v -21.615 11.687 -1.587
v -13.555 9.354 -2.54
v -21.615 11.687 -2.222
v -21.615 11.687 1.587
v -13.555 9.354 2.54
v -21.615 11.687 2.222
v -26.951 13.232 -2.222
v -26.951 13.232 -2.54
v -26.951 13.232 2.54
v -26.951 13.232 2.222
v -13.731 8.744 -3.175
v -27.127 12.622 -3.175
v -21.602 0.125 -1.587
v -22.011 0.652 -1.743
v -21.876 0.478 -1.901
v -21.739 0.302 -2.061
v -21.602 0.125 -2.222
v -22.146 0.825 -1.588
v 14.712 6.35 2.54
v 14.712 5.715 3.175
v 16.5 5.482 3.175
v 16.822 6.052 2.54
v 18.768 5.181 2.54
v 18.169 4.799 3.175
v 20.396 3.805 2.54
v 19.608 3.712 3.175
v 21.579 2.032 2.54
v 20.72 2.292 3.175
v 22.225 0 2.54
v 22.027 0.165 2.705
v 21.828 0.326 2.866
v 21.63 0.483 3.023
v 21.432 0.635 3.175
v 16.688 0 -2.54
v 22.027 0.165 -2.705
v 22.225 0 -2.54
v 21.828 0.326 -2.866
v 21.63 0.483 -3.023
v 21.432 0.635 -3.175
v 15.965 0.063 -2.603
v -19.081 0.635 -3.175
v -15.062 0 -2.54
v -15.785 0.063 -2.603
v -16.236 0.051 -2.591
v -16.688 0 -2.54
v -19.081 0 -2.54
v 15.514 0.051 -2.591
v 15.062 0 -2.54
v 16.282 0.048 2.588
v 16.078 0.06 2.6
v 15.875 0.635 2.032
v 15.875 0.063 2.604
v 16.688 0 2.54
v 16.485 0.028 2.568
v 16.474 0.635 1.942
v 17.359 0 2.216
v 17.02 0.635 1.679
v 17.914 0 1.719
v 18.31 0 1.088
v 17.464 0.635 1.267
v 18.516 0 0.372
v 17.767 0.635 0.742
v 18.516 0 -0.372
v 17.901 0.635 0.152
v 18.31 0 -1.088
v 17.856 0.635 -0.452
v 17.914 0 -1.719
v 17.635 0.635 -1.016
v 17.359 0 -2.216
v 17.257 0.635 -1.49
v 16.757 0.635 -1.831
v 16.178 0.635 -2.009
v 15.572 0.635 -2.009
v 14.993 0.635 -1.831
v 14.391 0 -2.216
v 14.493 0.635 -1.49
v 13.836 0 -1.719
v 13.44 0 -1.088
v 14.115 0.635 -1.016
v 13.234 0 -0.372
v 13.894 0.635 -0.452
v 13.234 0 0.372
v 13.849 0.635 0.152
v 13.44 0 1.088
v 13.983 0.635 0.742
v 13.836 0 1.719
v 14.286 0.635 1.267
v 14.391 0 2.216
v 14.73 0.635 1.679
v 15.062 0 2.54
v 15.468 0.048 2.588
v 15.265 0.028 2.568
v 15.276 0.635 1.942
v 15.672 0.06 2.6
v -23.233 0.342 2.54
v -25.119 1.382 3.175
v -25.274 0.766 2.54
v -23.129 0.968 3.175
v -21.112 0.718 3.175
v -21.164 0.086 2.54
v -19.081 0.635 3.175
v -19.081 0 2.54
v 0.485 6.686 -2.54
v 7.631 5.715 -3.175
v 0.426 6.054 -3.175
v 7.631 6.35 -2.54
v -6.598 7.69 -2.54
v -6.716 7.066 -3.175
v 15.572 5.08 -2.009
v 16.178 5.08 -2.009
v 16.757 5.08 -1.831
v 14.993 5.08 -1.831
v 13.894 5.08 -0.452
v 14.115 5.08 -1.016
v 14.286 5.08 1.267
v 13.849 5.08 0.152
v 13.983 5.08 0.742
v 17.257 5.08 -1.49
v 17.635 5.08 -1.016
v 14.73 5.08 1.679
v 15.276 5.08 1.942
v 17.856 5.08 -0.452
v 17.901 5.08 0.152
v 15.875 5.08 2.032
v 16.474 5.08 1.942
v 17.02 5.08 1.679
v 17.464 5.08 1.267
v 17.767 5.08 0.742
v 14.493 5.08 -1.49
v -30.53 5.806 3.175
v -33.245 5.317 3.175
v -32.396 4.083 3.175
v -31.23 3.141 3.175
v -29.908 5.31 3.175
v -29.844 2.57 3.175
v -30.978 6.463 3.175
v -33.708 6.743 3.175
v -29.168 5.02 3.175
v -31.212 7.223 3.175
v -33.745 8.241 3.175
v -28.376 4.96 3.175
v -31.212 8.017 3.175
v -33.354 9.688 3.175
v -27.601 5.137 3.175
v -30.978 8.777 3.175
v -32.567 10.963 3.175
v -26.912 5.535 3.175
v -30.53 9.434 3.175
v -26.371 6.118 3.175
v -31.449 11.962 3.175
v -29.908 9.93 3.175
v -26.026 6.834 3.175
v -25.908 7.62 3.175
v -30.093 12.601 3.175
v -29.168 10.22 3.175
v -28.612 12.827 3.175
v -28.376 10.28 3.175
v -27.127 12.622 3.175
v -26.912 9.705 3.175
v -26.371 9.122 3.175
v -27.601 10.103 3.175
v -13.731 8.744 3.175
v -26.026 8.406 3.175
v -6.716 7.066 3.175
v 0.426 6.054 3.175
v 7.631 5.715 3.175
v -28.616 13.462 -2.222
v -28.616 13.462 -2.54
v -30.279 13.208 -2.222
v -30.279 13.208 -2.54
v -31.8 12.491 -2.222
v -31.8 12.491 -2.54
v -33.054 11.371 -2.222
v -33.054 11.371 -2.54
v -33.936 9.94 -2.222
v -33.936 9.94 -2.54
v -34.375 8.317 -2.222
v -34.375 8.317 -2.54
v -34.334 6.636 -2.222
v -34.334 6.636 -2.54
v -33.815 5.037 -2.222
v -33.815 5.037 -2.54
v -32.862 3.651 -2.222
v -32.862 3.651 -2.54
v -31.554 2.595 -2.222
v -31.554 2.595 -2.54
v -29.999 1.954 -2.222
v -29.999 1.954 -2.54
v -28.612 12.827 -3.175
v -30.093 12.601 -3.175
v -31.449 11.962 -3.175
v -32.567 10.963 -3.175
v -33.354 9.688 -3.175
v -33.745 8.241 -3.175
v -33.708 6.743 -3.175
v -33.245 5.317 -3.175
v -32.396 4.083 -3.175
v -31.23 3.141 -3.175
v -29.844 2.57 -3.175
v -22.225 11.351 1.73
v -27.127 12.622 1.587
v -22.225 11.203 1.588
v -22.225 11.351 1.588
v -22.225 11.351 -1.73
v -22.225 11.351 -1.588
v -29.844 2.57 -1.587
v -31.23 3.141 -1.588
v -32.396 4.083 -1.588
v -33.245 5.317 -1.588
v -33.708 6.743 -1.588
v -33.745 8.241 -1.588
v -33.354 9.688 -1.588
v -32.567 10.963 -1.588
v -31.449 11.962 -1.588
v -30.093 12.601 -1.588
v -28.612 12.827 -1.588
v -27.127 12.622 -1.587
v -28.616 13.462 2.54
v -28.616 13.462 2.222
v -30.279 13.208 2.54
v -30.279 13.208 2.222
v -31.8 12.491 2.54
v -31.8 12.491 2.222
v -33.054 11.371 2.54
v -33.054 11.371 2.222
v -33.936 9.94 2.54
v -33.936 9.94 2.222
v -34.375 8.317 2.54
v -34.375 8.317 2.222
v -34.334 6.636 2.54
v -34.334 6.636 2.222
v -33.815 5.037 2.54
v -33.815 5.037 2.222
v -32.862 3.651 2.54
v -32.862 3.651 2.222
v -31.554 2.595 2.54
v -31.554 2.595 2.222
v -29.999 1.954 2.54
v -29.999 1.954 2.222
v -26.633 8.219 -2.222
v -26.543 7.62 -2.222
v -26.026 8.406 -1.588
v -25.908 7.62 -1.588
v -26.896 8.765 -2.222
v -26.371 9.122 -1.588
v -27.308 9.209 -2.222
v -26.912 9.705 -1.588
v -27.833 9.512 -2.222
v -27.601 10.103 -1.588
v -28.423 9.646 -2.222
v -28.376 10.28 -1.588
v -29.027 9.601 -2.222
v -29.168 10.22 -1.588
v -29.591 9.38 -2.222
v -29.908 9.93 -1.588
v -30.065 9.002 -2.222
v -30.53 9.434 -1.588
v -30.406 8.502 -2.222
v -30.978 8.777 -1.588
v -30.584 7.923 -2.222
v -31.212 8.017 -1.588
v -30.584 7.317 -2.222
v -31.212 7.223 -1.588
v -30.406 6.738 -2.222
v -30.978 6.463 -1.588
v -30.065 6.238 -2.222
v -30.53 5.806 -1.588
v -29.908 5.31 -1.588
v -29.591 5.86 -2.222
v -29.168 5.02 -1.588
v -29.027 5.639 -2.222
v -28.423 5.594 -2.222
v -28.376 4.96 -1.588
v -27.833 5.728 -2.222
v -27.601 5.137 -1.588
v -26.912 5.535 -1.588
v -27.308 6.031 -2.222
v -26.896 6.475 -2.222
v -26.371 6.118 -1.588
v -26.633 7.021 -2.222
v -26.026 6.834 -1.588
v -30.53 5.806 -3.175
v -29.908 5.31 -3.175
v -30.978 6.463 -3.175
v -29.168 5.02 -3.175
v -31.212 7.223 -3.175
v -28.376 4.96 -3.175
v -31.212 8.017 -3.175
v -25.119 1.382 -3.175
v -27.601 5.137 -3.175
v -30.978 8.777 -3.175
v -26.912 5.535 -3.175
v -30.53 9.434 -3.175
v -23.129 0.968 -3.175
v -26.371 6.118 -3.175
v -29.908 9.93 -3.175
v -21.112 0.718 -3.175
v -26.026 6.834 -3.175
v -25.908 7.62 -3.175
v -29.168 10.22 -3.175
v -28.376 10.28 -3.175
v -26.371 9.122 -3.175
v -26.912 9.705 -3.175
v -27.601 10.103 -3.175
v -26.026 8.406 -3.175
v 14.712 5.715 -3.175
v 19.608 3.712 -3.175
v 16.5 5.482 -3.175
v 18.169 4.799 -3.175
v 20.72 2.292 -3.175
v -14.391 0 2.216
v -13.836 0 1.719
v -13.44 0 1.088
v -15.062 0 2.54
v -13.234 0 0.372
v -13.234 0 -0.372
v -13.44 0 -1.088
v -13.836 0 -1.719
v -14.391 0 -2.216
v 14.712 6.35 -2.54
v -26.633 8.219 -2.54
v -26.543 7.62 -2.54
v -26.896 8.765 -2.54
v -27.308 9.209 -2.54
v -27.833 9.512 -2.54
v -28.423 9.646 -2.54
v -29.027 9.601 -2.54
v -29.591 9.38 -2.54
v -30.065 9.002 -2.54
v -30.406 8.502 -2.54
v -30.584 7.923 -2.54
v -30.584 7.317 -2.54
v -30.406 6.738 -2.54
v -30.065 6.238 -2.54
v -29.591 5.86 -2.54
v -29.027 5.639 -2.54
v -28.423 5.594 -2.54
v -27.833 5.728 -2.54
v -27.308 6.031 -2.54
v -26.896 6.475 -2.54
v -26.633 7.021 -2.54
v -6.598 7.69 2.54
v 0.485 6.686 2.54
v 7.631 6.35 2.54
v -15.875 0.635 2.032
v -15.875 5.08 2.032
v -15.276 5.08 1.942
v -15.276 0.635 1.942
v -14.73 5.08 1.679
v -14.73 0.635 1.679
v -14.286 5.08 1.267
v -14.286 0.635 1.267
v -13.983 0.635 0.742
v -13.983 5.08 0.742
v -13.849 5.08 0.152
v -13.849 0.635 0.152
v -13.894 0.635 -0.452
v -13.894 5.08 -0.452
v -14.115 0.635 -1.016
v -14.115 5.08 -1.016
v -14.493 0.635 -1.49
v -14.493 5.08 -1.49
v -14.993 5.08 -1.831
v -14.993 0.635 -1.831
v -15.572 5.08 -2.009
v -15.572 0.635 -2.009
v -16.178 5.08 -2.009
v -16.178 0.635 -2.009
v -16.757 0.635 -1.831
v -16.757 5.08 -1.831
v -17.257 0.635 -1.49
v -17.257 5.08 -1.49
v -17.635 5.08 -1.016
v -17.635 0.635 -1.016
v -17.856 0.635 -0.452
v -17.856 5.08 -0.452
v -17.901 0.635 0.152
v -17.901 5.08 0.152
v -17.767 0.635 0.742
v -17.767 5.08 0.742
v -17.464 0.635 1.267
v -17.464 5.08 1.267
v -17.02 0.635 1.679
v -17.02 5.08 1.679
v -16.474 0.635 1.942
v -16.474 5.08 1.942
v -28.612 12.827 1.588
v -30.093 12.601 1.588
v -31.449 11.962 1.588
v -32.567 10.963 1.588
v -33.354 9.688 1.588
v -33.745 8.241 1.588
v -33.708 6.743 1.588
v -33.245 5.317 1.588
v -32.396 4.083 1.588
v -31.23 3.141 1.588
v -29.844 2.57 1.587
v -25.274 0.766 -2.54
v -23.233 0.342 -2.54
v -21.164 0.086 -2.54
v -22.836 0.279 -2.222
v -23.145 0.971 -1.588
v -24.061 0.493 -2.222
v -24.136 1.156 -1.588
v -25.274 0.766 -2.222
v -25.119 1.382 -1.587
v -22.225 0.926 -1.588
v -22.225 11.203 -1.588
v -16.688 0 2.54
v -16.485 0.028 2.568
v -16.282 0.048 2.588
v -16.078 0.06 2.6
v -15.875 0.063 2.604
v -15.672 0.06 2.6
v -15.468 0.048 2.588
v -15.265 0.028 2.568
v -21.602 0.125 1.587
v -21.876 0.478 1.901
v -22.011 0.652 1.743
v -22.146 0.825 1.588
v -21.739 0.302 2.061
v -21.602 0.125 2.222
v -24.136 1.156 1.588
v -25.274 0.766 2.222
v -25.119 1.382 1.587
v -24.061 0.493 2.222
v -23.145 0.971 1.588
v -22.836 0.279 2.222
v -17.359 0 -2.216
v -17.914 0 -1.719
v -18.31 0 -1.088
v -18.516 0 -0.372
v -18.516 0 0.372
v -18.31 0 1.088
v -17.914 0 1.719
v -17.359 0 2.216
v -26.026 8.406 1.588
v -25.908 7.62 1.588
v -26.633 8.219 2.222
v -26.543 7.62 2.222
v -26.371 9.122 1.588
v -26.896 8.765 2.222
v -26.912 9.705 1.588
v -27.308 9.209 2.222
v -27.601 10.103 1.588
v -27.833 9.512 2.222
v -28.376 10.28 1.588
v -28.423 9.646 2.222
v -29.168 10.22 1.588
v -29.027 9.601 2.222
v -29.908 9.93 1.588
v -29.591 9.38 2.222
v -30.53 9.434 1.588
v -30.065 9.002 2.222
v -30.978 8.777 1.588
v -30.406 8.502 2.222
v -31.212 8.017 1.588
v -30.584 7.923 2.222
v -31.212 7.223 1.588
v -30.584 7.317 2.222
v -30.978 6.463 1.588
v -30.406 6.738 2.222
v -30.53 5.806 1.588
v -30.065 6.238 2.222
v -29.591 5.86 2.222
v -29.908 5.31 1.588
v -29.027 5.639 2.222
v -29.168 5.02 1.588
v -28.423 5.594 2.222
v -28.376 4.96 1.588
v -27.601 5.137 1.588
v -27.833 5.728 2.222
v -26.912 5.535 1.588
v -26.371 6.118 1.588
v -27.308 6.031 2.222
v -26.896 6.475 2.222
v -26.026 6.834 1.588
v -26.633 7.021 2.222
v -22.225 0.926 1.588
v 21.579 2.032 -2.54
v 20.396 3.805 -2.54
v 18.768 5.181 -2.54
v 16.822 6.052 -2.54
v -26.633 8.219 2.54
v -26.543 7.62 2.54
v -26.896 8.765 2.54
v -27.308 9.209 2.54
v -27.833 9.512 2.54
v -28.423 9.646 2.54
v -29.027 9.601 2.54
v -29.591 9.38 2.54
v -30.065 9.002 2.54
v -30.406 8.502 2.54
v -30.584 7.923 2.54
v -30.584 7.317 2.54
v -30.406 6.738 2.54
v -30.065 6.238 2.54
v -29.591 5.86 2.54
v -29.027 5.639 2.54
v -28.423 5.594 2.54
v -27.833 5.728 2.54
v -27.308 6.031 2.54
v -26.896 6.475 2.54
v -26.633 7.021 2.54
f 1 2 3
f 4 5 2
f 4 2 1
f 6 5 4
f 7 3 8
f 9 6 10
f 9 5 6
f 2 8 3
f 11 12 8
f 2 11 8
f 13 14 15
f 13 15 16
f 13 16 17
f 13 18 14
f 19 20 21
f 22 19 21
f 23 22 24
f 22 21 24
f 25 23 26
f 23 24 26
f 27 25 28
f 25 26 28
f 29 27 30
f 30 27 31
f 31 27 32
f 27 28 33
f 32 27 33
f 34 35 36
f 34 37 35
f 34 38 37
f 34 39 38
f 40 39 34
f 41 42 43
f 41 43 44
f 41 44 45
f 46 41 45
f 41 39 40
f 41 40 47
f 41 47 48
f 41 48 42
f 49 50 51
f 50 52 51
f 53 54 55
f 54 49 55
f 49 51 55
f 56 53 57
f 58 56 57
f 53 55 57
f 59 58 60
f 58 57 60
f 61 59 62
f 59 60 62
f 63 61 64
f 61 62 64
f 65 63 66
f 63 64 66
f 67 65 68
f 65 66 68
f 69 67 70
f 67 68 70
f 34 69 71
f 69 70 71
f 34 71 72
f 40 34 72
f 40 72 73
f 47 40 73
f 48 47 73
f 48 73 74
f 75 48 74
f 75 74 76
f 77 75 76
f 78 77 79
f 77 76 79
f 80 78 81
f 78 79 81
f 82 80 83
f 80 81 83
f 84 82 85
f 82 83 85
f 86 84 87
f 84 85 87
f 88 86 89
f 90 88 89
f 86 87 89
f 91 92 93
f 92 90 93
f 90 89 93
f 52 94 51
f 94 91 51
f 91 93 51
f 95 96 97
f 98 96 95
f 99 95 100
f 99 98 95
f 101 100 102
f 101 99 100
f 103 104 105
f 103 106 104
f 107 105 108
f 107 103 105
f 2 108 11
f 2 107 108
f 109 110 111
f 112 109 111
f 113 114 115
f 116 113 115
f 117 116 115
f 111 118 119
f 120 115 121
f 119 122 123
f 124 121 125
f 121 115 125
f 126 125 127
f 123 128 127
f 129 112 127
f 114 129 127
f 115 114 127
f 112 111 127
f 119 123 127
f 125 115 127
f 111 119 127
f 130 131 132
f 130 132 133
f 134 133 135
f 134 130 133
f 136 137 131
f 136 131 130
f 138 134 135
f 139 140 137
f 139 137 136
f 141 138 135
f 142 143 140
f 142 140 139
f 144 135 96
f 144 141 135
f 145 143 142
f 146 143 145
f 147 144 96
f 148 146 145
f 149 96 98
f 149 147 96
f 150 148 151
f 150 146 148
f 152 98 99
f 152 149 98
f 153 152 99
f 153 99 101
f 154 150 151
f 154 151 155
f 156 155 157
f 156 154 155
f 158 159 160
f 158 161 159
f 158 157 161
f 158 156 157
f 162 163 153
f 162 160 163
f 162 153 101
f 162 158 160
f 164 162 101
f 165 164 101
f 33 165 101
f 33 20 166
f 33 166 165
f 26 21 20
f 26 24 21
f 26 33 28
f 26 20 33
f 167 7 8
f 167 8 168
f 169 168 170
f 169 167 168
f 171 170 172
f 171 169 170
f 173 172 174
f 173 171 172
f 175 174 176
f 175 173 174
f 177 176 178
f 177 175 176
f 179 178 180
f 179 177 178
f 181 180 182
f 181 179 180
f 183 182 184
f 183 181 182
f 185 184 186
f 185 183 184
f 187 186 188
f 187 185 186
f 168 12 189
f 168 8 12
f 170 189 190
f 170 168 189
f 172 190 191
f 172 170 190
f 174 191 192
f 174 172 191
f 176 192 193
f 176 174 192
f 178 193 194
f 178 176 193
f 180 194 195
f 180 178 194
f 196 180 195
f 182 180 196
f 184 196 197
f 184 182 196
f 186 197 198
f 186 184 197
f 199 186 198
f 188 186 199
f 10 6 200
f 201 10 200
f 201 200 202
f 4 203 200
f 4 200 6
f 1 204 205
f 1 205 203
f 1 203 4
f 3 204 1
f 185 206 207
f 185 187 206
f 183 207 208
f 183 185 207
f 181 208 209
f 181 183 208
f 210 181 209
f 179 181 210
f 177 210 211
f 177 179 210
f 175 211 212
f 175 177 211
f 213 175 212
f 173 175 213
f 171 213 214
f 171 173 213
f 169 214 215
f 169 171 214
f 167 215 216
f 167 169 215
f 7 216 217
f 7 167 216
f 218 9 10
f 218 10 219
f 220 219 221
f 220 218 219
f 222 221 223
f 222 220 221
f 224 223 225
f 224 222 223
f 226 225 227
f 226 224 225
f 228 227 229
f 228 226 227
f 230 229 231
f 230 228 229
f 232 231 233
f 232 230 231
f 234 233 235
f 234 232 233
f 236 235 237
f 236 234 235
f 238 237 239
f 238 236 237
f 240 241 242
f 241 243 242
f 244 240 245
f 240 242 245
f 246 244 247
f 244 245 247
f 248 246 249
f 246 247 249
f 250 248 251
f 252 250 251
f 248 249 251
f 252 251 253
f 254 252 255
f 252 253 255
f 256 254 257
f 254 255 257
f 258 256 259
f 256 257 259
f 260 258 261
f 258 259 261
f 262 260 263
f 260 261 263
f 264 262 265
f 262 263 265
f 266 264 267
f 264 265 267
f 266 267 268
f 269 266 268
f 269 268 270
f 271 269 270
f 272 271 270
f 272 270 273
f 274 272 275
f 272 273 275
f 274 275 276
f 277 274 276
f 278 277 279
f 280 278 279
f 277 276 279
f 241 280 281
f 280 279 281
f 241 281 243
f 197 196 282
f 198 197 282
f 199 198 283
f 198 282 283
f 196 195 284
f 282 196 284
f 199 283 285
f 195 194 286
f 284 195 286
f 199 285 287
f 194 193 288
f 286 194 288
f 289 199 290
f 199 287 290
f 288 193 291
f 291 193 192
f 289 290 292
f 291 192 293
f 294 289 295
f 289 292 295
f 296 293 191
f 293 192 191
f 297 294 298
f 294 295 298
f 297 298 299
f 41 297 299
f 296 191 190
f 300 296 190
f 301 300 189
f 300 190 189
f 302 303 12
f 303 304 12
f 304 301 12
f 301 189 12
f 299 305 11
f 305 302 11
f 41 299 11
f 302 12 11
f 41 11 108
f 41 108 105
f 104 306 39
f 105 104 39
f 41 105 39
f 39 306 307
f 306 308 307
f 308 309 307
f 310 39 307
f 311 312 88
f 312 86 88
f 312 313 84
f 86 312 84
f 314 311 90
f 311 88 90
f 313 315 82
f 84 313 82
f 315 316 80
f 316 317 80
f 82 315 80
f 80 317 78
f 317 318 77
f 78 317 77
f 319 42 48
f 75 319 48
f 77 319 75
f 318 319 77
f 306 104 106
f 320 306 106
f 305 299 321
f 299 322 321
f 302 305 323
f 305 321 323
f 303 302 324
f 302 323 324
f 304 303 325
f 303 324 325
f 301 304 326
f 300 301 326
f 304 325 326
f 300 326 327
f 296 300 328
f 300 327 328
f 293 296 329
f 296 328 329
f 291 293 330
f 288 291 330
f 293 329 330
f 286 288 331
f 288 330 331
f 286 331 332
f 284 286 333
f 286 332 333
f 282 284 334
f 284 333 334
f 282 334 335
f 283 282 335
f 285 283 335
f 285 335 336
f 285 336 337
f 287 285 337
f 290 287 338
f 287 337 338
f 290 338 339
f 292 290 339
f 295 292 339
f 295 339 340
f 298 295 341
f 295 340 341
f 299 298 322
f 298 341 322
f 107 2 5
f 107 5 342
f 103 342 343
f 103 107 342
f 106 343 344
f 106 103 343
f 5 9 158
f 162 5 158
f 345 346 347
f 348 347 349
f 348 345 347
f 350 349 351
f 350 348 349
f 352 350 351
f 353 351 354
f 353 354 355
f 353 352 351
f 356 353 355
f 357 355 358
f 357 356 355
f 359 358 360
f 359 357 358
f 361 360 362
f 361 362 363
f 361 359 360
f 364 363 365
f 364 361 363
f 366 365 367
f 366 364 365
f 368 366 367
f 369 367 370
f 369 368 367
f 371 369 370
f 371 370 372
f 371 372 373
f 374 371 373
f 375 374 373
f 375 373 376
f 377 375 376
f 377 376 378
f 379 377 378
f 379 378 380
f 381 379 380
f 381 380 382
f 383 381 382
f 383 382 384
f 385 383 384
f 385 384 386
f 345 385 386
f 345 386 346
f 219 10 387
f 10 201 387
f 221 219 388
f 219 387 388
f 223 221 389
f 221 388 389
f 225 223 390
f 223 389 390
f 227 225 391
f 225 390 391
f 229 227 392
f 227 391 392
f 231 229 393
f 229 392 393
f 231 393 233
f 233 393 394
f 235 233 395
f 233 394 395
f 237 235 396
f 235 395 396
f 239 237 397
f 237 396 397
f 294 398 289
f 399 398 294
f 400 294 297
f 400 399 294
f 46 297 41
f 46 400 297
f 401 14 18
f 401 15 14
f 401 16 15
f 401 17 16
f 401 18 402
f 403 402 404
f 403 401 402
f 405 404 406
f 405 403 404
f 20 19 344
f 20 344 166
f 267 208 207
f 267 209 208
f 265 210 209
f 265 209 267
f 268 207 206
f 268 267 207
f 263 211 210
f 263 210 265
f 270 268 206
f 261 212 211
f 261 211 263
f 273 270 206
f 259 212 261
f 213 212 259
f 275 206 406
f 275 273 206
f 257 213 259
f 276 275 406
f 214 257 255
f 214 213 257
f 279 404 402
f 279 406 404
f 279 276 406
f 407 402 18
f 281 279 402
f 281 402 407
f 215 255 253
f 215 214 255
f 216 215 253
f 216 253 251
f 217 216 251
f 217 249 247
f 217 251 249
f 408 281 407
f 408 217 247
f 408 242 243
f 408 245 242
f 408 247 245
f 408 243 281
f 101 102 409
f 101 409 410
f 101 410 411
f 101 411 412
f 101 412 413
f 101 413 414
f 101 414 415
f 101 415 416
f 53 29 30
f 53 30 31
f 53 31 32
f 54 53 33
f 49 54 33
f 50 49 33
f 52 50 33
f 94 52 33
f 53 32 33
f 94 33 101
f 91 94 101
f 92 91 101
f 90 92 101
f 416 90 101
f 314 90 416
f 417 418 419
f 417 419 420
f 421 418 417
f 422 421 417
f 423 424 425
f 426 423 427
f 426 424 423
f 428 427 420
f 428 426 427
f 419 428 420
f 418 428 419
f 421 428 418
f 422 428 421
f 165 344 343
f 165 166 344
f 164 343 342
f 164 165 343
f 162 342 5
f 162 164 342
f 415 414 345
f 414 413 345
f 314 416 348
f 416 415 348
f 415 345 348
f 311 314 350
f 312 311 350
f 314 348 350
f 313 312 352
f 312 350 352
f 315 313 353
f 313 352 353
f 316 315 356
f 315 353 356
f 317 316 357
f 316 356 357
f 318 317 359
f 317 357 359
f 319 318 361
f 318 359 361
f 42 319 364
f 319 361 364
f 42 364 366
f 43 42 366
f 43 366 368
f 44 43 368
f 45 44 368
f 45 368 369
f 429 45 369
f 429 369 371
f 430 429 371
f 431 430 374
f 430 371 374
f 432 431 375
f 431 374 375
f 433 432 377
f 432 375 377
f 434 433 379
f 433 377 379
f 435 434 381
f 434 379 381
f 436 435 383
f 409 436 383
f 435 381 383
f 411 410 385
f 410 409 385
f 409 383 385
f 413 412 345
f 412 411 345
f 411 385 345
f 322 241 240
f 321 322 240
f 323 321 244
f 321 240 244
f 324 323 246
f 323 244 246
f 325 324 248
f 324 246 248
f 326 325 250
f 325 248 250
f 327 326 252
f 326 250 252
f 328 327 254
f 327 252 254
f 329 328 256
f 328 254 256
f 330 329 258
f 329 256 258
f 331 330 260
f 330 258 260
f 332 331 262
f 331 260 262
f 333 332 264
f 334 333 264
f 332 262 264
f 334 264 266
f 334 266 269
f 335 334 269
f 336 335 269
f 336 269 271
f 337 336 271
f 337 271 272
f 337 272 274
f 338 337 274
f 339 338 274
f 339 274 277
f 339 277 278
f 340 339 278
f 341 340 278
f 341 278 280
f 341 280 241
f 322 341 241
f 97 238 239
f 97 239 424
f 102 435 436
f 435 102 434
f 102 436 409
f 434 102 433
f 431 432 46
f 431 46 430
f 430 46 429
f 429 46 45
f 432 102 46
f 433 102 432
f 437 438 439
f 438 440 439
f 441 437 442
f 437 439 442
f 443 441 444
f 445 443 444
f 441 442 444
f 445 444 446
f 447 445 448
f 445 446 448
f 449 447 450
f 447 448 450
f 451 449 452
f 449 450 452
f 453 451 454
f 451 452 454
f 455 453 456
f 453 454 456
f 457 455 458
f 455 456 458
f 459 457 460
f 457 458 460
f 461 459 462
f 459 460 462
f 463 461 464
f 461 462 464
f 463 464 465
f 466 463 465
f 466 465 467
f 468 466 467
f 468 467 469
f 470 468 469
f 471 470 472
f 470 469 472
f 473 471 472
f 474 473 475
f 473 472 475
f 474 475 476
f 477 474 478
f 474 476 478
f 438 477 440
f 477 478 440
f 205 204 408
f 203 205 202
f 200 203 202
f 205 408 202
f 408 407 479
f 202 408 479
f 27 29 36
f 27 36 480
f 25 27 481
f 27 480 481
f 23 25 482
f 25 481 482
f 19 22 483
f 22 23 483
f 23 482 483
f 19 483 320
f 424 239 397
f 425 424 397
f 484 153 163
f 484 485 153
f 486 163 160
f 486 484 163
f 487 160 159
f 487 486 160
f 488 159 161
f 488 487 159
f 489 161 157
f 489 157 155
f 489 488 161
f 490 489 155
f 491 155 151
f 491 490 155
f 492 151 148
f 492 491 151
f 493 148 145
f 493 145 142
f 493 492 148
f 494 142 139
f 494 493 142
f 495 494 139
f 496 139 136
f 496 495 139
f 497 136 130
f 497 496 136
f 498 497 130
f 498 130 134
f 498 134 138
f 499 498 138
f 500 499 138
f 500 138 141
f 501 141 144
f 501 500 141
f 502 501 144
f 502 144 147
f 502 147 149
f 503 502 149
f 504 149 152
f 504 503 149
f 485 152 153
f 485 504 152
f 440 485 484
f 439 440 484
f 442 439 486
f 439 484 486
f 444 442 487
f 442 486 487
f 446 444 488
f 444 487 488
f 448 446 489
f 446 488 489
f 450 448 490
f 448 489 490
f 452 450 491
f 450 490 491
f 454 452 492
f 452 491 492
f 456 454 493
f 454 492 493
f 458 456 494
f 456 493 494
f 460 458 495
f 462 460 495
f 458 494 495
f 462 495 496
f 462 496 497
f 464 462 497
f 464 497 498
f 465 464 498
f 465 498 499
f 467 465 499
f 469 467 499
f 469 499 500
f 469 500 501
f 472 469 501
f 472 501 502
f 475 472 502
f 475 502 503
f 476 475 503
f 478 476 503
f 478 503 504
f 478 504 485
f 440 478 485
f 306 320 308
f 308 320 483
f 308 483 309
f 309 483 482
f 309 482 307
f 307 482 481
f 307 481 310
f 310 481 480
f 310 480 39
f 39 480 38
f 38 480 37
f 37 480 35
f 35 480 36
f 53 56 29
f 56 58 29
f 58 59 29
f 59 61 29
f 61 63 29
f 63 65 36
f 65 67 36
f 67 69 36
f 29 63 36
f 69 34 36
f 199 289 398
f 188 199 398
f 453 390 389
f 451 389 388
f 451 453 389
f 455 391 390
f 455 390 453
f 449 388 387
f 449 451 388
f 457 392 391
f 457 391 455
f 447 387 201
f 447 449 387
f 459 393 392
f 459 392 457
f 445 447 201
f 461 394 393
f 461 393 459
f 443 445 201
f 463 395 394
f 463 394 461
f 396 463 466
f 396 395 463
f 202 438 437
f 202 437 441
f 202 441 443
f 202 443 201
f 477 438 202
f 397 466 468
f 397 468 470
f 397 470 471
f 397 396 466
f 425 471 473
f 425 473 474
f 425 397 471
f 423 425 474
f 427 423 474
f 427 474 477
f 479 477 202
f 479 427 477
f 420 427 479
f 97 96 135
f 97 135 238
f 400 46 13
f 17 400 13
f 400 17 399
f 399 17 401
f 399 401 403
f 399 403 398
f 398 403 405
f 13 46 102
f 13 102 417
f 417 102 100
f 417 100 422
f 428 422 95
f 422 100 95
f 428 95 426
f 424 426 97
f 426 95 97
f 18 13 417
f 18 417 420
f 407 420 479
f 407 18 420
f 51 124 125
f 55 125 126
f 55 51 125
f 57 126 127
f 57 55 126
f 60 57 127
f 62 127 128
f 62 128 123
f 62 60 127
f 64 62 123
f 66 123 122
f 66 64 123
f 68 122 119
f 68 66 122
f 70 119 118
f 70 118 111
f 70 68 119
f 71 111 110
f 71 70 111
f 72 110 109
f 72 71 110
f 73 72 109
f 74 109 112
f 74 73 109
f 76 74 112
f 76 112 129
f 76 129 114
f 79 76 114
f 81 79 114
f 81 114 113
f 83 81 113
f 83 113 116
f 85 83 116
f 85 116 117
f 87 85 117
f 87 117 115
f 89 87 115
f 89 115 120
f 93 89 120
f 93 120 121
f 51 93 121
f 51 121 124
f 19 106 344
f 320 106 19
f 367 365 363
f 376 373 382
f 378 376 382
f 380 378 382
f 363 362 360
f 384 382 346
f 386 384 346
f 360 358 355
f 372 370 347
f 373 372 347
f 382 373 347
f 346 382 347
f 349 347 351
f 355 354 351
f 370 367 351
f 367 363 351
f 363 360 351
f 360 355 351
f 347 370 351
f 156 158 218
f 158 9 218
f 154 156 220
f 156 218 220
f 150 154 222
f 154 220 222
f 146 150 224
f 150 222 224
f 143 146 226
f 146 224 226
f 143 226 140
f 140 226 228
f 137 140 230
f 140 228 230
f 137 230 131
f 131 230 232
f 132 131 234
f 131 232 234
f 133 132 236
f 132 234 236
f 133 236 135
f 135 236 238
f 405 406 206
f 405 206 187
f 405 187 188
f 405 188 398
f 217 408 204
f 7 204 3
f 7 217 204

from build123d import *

# Parameters (mm, degrees)
SKETCH1_W           = 44.45
SKETCH1_H           = 6.35
BOSS_EXTRUDE1_DEPTH = 6.35
SKETCH2_R           = 5.842
SKETCH2_R_2         = 2.032
BOSS_EXTRUDE2_DEPTH = 6.35
SKETCH4_W           = 12.192
SKETCH4_H           = 3.175
CUT_EXTRUDE2_DEPTH  = 38.092262778
FILLET1_R           = 76.2
FILLET2_R           = 25.4
FILLET3_R           = 7.62
SKETCH1_3_R         = 2.032
CUT_EXTRUDE1_DEPTH  = 5.08
CHAMFER2_SIZE       = 0.635
CHAMFER2_SIZE_2     = 0.512675012
CHAMFER2_SIZE_3     = 0.731105081


with BuildPart() as part:
    # Sketch1 → Boss-Extrude1 (new body)
    with BuildSketch(Plane(origin=(0, 0, 0), x_dir=(1, 0, 0), z_dir=(0, 1, 0))):
        Rectangle(SKETCH1_W, SKETCH1_H)
    extrude(amount=BOSS_EXTRUDE1_DEPTH)

    # Sketch2 → Boss-Extrude2 (add, through all)
    # profile 1 of 2: a face of its own
    with BuildSketch(Plane.XY.offset(3.175)):
        with BuildLine():
            Line((-3.175, 6.35), (-26.950756689, 13.231666211))
            ThreePointArc((-26.950756689, 13.231666211), (-23.905000352, 11.12999534), (-22.733, 7.62))
            ThreePointArc((-22.733, 7.62), (-24.982746663, 3.012974934), (-29.999237577, 1.954268686))
            Line((-29.999237577, 1.954268686), (-22.225, 0))
            Line((-22.225, 0), (-22.225, 6.35))
            Line((-22.225, 6.35), (-3.175, 6.35))
        make_face()
    # profile 2 of 2: a face of its own
    with BuildSketch(Plane.XY.offset(3.175)):
        with Locations((-28.575, 7.62)):
            Circle(SKETCH2_R)
        with Locations((-28.575, 7.62)):
            Circle(SKETCH2_R_2, mode=Mode.SUBTRACT)
    extrude(amount=-BOSS_EXTRUDE2_DEPTH)

    # Sketch4 → Cut-Extrude2 (cut, through all)
    with BuildSketch(Plane.XZ):
        with Locations((-28.321, 0)):
            Rectangle(SKETCH4_W, SKETCH4_H)
    extrude(amount=-CUT_EXTRUDE2_DEPTH, mode=Mode.SUBTRACT)

    # Fillet1
    fillet1_edges = [part.edges().sort_by_distance(p)[0] for p in [
        (-3.175, 6.35, 0),
    ]]
    fillet(fillet1_edges, radius=FILLET1_R)

    # Fillet2
    # the kernel refuses this fillet: 25.4 mm, written as the material it takes off along each edge
    with BuildSketch(Plane(origin=(-22.225, 0, 6.271484857), x_dir=(-0.9698273389527705, 0.2437928067433249, 0), z_dir=(0, 0, -1))) as fillet2_piece_1:
        with BuildLine():
            CenterArc((FILLET2_R * 0.123763541059, FILLET2_R), FILLET2_R, 255.889496413, 14.110503587)
            Line((-FILLET2_R * 0.120029265684, FILLET2_R * 0.0301726610472), (0, 0))
            Line((0, 0), (FILLET2_R * 0.123763541059, 0))
        make_face()
    extrude(amount=17.305469714, mode=Mode.SUBTRACT)
    with BuildSketch(Plane(origin=(-22.225, 0, 11.033984857), x_dir=(1, 0, 0), z_dir=(0, 0, -1))) as fillet2_piece_2:
        with BuildLine():
            CenterArc((FILLET2_R * 0.123763541059, -FILLET2_R), FILLET2_R, 90, 14.110503587)
            Line((-FILLET2_R * 0.120029265684, -FILLET2_R * 0.0301726610472), (0, 0))
            Line((0, 0), (FILLET2_R * 0.123763541059, 0))
        make_face()
    extrude(amount=17.305469714, mode=Mode.SUBTRACT)

    # Fillet3
    # the kernel refuses this fillet: 7.62 mm, written as the material it takes off along each edge
    with BuildSketch(Plane(origin=(22.225, 6.35, -21.958553311), x_dir=(0, -1, 0), z_dir=(0, 0, 1))) as fillet3_piece_1:
        with BuildLine():
            CenterArc((7.62, -7.513421325), FILLET3_R, 99.594068227, 80.405931773)
            Line((0, -7.513421325), (-0.1524, -7.513421325))
            Line((-0.1524, -7.513421325), (-0.1524, 0))
            Line((-0.1524, 0), (0, 0.1524))
            ThreePointArc((0, 0.1524), (3.175, 0.1524), (6.3246, 0.150268426))
            Line((6.3246, 0.150268426), (6.35, 0))
        make_face()
    extrude(amount=43.917106623, mode=Mode.SUBTRACT)

    # Sketch1<3> → Cut-Extrude1 (cut)
    with BuildSketch(Plane(origin=(0, 0, 0), x_dir=(1, 0, 0), z_dir=(0, 1, 0))):
        with Locations(Location((-15.875, 0, 0), (0, 0, 270))):
            Circle(SKETCH1_3_R)
        with Locations(Location((15.875, 0, 0), (0, 0, 270))):
            Circle(SKETCH1_3_R)
    extrude(amount=CUT_EXTRUDE1_DEPTH, mode=Mode.SUBTRACT)

    # Chamfer2
    # the kernel refuses this chamfer: 0.731105081, 0.635, 0.512675012 mm, written as the material it takes off along each edge
    with BuildSketch(Plane(origin=(-13.554867596, 9.354353764, 3.175), x_dir=(0, 0, -1), z_dir=(-0.9605727852432785, 0.27802863926216387, 0)), Plane(origin=(-13.554867596, 9.354353764, -3.175), x_dir=(-0.27802863926216387, -0.9605727852432785, 0), z_dir=(-0.9605727852432785, 0.27802863926216387, 0))) as chamfer2_piece_1:
        Polygon((CHAMFER2_SIZE, 0), (0, CHAMFER2_SIZE), (0, 0), align=None)
    extrude(amount=13.945730401, mode=Mode.SUBTRACT)
    with BuildSketch(Plane(origin=(-29.999237577, 1.954268686, -3.175), x_dir=(0.2437928067433245, 0.9698273389527705, 0), z_dir=(0.9698273389527705, -0.24379280674332449, 0))) as chamfer2_piece_2:
        Polygon((CHAMFER2_SIZE, 0), (0, CHAMFER2_SIZE), (0, 0), align=None)
    extrude(amount=4.872510847, mode=Mode.SUBTRACT)
    with BuildSketch(Plane(origin=(-28.575, 7.62, -3.175), x_dir=(0.2780286392621638, 0.9605727852432784, 0), z_dir=(0.9605727852432784, -0.2780286392621638, 0))) as chamfer2_piece_3:
        Polygon((5.842 - CHAMFER2_SIZE, 0), (5.842, CHAMFER2_SIZE), (5.842, 0), align=None)
    revolve(axis=Axis((-28.575, 7.62, -3.175), (0, 0, 1)), revolution_arc=182.032079325, mode=Mode.SUBTRACT)
    with BuildSketch(Plane(origin=(-28.575, 7.62, 3.175), x_dir=(1, 0, 0), z_dir=(0, -1, 0))) as chamfer2_piece_4:
        Polygon((2.032 + CHAMFER2_SIZE, 0), (2.032, -CHAMFER2_SIZE), (2.032, 0), align=None)
    revolve(axis=Axis((-28.575, 7.62, 3.175), (0, 0, 1)), mode=Mode.SUBTRACT)
    with BuildSketch(Plane(origin=(-28.575, 7.62, -3.175), x_dir=(1, 0, 0), z_dir=(0, -1, 0))) as chamfer2_piece_5:
        Polygon((2.032 + CHAMFER2_SIZE, 0), (2.032, CHAMFER2_SIZE), (2.032, 0), align=None)
    revolve(axis=Axis((-28.575, 7.62, -3.175), (0, 0, 1)), mode=Mode.SUBTRACT)
    with BuildSketch(Plane(origin=(-28.575, 7.62, 3.175), x_dir=(0.2780286392621638, 0.9605727852432784, 0), z_dir=(0.9605727852432784, -0.2780286392621638, 0))) as chamfer2_piece_6:
        Polygon((5.842 - CHAMFER2_SIZE, 0), (5.842, -CHAMFER2_SIZE), (5.842, 0), align=None)
    revolve(axis=Axis((-28.575, 7.62, 3.175), (0, 0, 1)), revolution_arc=182.032079325, mode=Mode.SUBTRACT)
    with BuildSketch(Plane(origin=(-29.999237577, 1.954268686, 3.175), x_dir=(0.24379280674332446, 0.9698273389527705, 0), z_dir=(0.9698273389527705, -0.24379280674332449, 0))) as chamfer2_piece_7:
        Polygon((CHAMFER2_SIZE, 0), (0, -CHAMFER2_SIZE), (0, 0), align=None)
    extrude(amount=4.872510847, mode=Mode.SUBTRACT)
    with BuildSketch(Plane(origin=(-28.575, 7.62, -1.5875), x_dir=(1, 0, 0), z_dir=(0, -1, 0))) as chamfer2_piece_8:
        Polygon((2.032, -CHAMFER2_SIZE), (2.032 + CHAMFER2_SIZE, 0), (2.032, 0), align=None)
    revolve(axis=Axis((-28.575, 7.62, -1.5875), (0, 0, 1)), mode=Mode.SUBTRACT)
    with BuildSketch(Plane(origin=(-28.575, 7.62, 1.5875), x_dir=(1, 0, 0), z_dir=(0, -1, 0))) as chamfer2_piece_9:
        Polygon((2.032 + CHAMFER2_SIZE, 0), (2.032, CHAMFER2_SIZE), (2.032, 0), align=None)
    revolve(axis=Axis((-28.575, 7.62, 1.5875), (0, 0, 1)), mode=Mode.SUBTRACT)
    with BuildSketch(Plane(origin=(7.630914716, 6.35, -3.175), x_dir=(0, -1, 0), z_dir=(1, 0, 0))) as chamfer2_piece_10:
        Polygon((CHAMFER2_SIZE, 0), (0, -CHAMFER2_SIZE), (0, 0), align=None)
    extrude(amount=7.08066396, mode=Mode.SUBTRACT)
    with BuildSketch(Plane(origin=(14.711578675, 6.35, 3.175), x_dir=(0, 0, -1), z_dir=(-1, 0, 0))) as chamfer2_piece_11:
        Polygon((CHAMFER2_SIZE, 0), (0, CHAMFER2_SIZE), (0, 0), align=None)
    extrude(amount=7.08066396, mode=Mode.SUBTRACT)
    with BuildSketch(Plane(origin=(7.630914716, 82.55, 3.175), x_dir=(0, -1, 0), z_dir=(1, 0, 0))) as chamfer2_piece_12:
        Polygon((76.2, CHAMFER2_SIZE), (76.2 + CHAMFER2_SIZE, 0), (76.2, 0), align=None)
    revolve(axis=Axis((7.630914716, 82.55, 3.175), (0, 0, -1)), revolution_arc=16.142582912, mode=Mode.SUBTRACT)
    with BuildSketch(Plane(origin=(7.630914716, 82.55, -3.175), x_dir=(0, -1, 0), z_dir=(1, 0, 0))) as chamfer2_piece_13:
        Polygon((76.2 + CHAMFER2_SIZE, 0), (76.2, -CHAMFER2_SIZE), (76.2, 0), align=None)
    revolve(axis=Axis((7.630914716, 82.55, -3.175), (0, 0, -1)), revolution_arc=16.142582912, mode=Mode.SUBTRACT)
    with BuildSketch(Plane(origin=(23.858018697, 0, 3.175), x_dir=(0, 0, -1), z_dir=(-1, 0, 0))) as chamfer2_piece_14:
        Polygon((CHAMFER2_SIZE, 0), (0, -CHAMFER2_SIZE), (0, 0), align=None)
    extrude(amount=42.939424754, mode=Mode.SUBTRACT)
    with BuildSketch(Plane(origin=(-19.081406057, 25.4, 3.175), x_dir=(-0.24379280674296488, -0.9698273389528609, 0), z_dir=(-0.9698273389528609, 0.24379280674296488, 0))) as chamfer2_piece_15:
        Polygon((25.4, -CHAMFER2_SIZE), (25.4 - CHAMFER2_SIZE, 0), (25.4, 0), align=None)
    revolve(axis=Axis((-19.081406057, 25.4, 3.175), (0, 0, 1)), revolution_arc=14.110503587, mode=Mode.SUBTRACT)
    with BuildSketch(Plane(origin=(-19.081406057, 0, -3.175), x_dir=(0, 1, 0), z_dir=(1, 0, 0))) as chamfer2_piece_16:
        Polygon((CHAMFER2_SIZE, 0), (0, CHAMFER2_SIZE), (0, 0), align=None)
    extrude(amount=42.939424754, mode=Mode.SUBTRACT)
    with BuildSketch(Plane(origin=(-19.081406057, 25.4, -3.175), x_dir=(-0.24379280674296488, -0.9698273389528609, 0), z_dir=(-0.9698273389528609, 0.24379280674296488, 0))) as chamfer2_piece_17:
        Polygon((25.4 - CHAMFER2_SIZE, 0), (25.4, CHAMFER2_SIZE), (25.4, 0), align=None)
    revolve(axis=Axis((-19.081406057, 25.4, -3.175), (0, 0, 1)), revolution_arc=14.110503587, mode=Mode.SUBTRACT)
    with BuildSketch(Plane(origin=(14.711578675, -1.27, 3.175), x_dir=(0, 1, 0), z_dir=(-1, 0, 0))) as chamfer2_piece_18:
        Polygon((7.62, CHAMFER2_SIZE), (7.62 - CHAMFER2_SIZE, 0), (7.62, 0), align=None)
    revolve(axis=Axis((14.711578675, -1.27, 3.175), (0, 0, -1)), revolution_arc=92.688750294, mode=Mode.SUBTRACT)
    with BuildSketch(Plane(origin=(14.711578675, -1.27, -3.175), x_dir=(0, 1, 0), z_dir=(-1, 0, 0))) as chamfer2_piece_19:
        Polygon((7.62 - CHAMFER2_SIZE, 0), (7.62, -CHAMFER2_SIZE), (7.62, 0), align=None)
    revolve(axis=Axis((14.711578675, -1.27, -3.175), (0, 0, -1)), revolution_arc=92.688750294, mode=Mode.SUBTRACT)
    with BuildSketch(Plane(origin=(-15.875, 0, 0), x_dir=(0, 0, 1), z_dir=(-1, 0, 0))) as chamfer2_piece_20:
        Polygon((2.032 + CHAMFER2_SIZE, 0), (2.032, CHAMFER2_SIZE), (2.032, 0), align=None)
    revolve(axis=Axis((-15.875, 0, 0), (0, 1, 0)), mode=Mode.SUBTRACT)
    with BuildSketch(Plane(origin=(15.875, 0, 0), x_dir=(0, 0, 1), z_dir=(-1, 0, 0))) as chamfer2_piece_21:
        Polygon((2.032 + CHAMFER2_SIZE, 0), (2.032, CHAMFER2_SIZE), (2.032, 0), align=None)
    revolve(axis=Axis((15.875, 0, 0), (0, 1, 0)), mode=Mode.SUBTRACT)
    with BuildSketch(Plane(origin=(-22.225, 11.86384097, 1.5875), x_dir=(0.9605727852432789, -0.278028639262162, 0), z_dir=(0, 0, -1))) as chamfer2_piece_22:
        Polygon((CHAMFER2_SIZE, 0), (CHAMFER2_SIZE_2 * 0.278028639187, CHAMFER2_SIZE_2 * 0.960572784984), (0, 0), align=None)
    extrude(amount=3.175, mode=Mode.SUBTRACT)
    with BuildSketch(Plane(origin=(-22.225, 0.195281848, -1.5875), x_dir=(0.9937643681365105, -0.11150058574842527, 0), z_dir=(0, 0, 1))) as chamfer2_piece_23:
        with BuildLine():
            Line((0.627301622, 0), (-CHAMFER2_SIZE_3 * 0.111500585736, CHAMFER2_SIZE_3 * 0.993764368022))
            Line((-CHAMFER2_SIZE_3 * 0.111500585736, CHAMFER2_SIZE_3 * 0.993764368022), (0, 0))
            ThreePointArc((0, 0), (0.323858306, -0.001934575), (0.627301622, 0))
        make_face()
    extrude(amount=3.175, mode=Mode.SUBTRACT)
    # the kernel refuses this chamfer: 0.731105081, 0.635, 0.512675012 mm, written as the material it takes off along each edge
    with BuildSketch(Plane(origin=(-28.575, 7.62, 1.5875), x_dir=(0.2780286392621638, 0.9605727852432784, 0), z_dir=(0.9605727852432784, -0.2780286392621638, 0))) as chamfer2_2_piece_1:
        Polygon((5.842, CHAMFER2_SIZE), (5.842 - CHAMFER2_SIZE, 0), (5.842, 0), align=None)
    revolve(axis=Axis((-28.575, 7.62, 1.5875), (0, 0, 1)), revolution_arc=182.032079325, mode=Mode.SUBTRACT)
    with BuildSketch(Plane(origin=(-25.273743348, 0.766385591, 1.5875), x_dir=(0, 0, 1), z_dir=(-0.9698273389527705, 0.24379280674332449, 0))) as chamfer2_2_piece_2:
        Polygon((CHAMFER2_SIZE, 0), (0, CHAMFER2_SIZE), (0, 0), align=None)
    extrude(amount=4.872510847, mode=Mode.SUBTRACT)
    with BuildSketch(Plane(origin=(-20.046402963, 11.233266818, 1.5875), x_dir=(0, 0, 1), z_dir=(-0.9605727852432785, 0.2780286392621639, 0))) as chamfer2_2_piece_3_section:
        Polygon((CHAMFER2_SIZE, 0), (0, -CHAMFER2_SIZE), (0, 0), align=None)
    chamfer2_2_piece_3 = extrude(amount=7.187746554, mode=Mode.PRIVATE)
    chamfer2_2_piece_3 = split(chamfer2_2_piece_3, bisect_by=Plane(origin=(-22.225, 11.233266818, 1.5875), z_dir=(-1, 0, 0)), keep=Keep.TOP, mode=Mode.PRIVATE)
    add(chamfer2_2_piece_3, mode=Mode.SUBTRACT)
    with BuildSketch(Plane(origin=(-20.046402963, 11.233266818, 1.5875), x_dir=(0, 0, 1), z_dir=(-0.9605727852432785, 0.2780286392621639, 0))) as chamfer2_2_piece_4_section:
        Polygon((CHAMFER2_SIZE, 0), (0, -CHAMFER2_SIZE), (0, 0), align=None)
    chamfer2_2_piece_4 = extrude(amount=7.187746554, mode=Mode.PRIVATE)
    chamfer2_2_piece_4 = split(chamfer2_2_piece_4, bisect_by=Plane(origin=(-20.603706639, 12.24459646, 1.5875), z_dir=(-0.48263159408242934, 0.8758234664551146, 0)), keep=Keep.TOP, mode=Mode.PRIVATE)
    add(chamfer2_2_piece_4, mode=Mode.SUBTRACT)
    with BuildSketch(Plane(origin=(-26.950756689, 13.231666211, -1.5875), x_dir=(-0.27802863926216387, -0.9605727852432785, 0), z_dir=(0.9605727852432785, -0.2780286392621639, 0))) as chamfer2_2_piece_5_section:
        Polygon((CHAMFER2_SIZE, 0), (0, CHAMFER2_SIZE), (0, 0), align=None)
    chamfer2_2_piece_5 = extrude(amount=7.187746554, mode=Mode.PRIVATE)
    chamfer2_2_piece_5 = split(chamfer2_2_piece_5, bisect_by=Plane(origin=(-25.055083199, 9.791619294, -1.5875), z_dir=(-0.48263159408242934, 0.8758234664551146, 0)), keep=Keep.TOP, mode=Mode.PRIVATE)
    add(chamfer2_2_piece_5, mode=Mode.SUBTRACT)
    with BuildSketch(Plane(origin=(-26.950756689, 13.231666211, -1.5875), x_dir=(-0.27802863926216387, -0.9605727852432785, 0), z_dir=(0.9605727852432785, -0.2780286392621639, 0))) as chamfer2_2_piece_6_section:
        Polygon((CHAMFER2_SIZE, 0), (0, CHAMFER2_SIZE), (0, 0), align=None)
    chamfer2_2_piece_6 = extrude(amount=7.187746554, mode=Mode.PRIVATE)
    chamfer2_2_piece_6 = split(chamfer2_2_piece_6, bisect_by=Plane(origin=(-22.225, 13.231666211, -1.5875), z_dir=(-1, 0, 0)), keep=Keep.TOP, mode=Mode.PRIVATE)
    add(chamfer2_2_piece_6, mode=Mode.SUBTRACT)
    with BuildSketch(Plane(origin=(-28.575, 7.62, -1.5875), x_dir=(-0.24379280674332418, -0.9698273389527706, 0), z_dir=(0.9698273389527706, -0.24379280674332418, 0))) as chamfer2_2_piece_7:
        Polygon((5.842 - CHAMFER2_SIZE, 0), (5.842, CHAMFER2_SIZE), (5.842, 0), align=None)
    revolve(axis=Axis((-28.575, 7.62, -1.5875), (0, 0, -1)), revolution_arc=182.032079325, mode=Mode.SUBTRACT)
    with BuildSketch(Plane(origin=(-29.999237577, 1.954268686, -1.5875), x_dir=(0.24379280674332454, 0.9698273389527706, 1.0490296295670768e-15), z_dir=(0.9698273389527705, -0.24379280674332449, 0))) as chamfer2_2_piece_8:
        Polygon((CHAMFER2_SIZE, 0), (0, -CHAMFER2_SIZE), (0, 0), align=None)
    extrude(amount=4.872510847, mode=Mode.SUBTRACT)
    with BuildSketch(Plane(origin=(-19.081406057, 25.4, 1.5875), x_dir=(-0.24379280674296486, -0.9698273389528609, 0), z_dir=(-0.9698273389528609, 0.24379280674296486, 0))) as chamfer2_2_piece_9_section:
        Polygon((25.4 - CHAMFER2_SIZE, 0), (25.4, CHAMFER2_SIZE), (25.4, 0), align=None)
    chamfer2_2_piece_9 = revolve(axis=Axis((-19.081406057, 25.4, 1.5875), (0, 0, 1)), revolution_arc=12.099888527, mode=Mode.PRIVATE)
    chamfer2_2_piece_9 = split(chamfer2_2_piece_9, bisect_by=Plane(origin=(-32.901208203, 14.645201948, 1.5875), z_dir=(-0.7891843983264014, -0.6141563200343995, 0)), keep=Keep.TOP, mode=Mode.PRIVATE)
    add(chamfer2_2_piece_9, mode=Mode.SUBTRACT)
    with BuildSketch(Plane(origin=(-19.081406057, 25.4, -1.5875), x_dir=(-0.03508465098697838, -0.9993843441164775, 0), z_dir=(0.9993843441164775, -0.03508465098697838, 0))) as chamfer2_2_piece_10_section:
        Polygon((25.4 - CHAMFER2_SIZE, 0), (25.4, CHAMFER2_SIZE), (25.4, 0), align=None)
    chamfer2_2_piece_10 = revolve(axis=Axis((-19.081406057, 25.4, -1.5875), (0, 0, -1)), revolution_arc=12.099888527, mode=Mode.PRIVATE)
    chamfer2_2_piece_10 = split(chamfer2_2_piece_10, bisect_by=Plane(origin=(-32.901208203, 14.645201948, -1.5875), z_dir=(-0.7891843983264014, -0.6141563200343995, 0)), keep=Keep.TOP, mode=Mode.PRIVATE)
    add(chamfer2_2_piece_10, mode=Mode.SUBTRACT)


solid = part.part
